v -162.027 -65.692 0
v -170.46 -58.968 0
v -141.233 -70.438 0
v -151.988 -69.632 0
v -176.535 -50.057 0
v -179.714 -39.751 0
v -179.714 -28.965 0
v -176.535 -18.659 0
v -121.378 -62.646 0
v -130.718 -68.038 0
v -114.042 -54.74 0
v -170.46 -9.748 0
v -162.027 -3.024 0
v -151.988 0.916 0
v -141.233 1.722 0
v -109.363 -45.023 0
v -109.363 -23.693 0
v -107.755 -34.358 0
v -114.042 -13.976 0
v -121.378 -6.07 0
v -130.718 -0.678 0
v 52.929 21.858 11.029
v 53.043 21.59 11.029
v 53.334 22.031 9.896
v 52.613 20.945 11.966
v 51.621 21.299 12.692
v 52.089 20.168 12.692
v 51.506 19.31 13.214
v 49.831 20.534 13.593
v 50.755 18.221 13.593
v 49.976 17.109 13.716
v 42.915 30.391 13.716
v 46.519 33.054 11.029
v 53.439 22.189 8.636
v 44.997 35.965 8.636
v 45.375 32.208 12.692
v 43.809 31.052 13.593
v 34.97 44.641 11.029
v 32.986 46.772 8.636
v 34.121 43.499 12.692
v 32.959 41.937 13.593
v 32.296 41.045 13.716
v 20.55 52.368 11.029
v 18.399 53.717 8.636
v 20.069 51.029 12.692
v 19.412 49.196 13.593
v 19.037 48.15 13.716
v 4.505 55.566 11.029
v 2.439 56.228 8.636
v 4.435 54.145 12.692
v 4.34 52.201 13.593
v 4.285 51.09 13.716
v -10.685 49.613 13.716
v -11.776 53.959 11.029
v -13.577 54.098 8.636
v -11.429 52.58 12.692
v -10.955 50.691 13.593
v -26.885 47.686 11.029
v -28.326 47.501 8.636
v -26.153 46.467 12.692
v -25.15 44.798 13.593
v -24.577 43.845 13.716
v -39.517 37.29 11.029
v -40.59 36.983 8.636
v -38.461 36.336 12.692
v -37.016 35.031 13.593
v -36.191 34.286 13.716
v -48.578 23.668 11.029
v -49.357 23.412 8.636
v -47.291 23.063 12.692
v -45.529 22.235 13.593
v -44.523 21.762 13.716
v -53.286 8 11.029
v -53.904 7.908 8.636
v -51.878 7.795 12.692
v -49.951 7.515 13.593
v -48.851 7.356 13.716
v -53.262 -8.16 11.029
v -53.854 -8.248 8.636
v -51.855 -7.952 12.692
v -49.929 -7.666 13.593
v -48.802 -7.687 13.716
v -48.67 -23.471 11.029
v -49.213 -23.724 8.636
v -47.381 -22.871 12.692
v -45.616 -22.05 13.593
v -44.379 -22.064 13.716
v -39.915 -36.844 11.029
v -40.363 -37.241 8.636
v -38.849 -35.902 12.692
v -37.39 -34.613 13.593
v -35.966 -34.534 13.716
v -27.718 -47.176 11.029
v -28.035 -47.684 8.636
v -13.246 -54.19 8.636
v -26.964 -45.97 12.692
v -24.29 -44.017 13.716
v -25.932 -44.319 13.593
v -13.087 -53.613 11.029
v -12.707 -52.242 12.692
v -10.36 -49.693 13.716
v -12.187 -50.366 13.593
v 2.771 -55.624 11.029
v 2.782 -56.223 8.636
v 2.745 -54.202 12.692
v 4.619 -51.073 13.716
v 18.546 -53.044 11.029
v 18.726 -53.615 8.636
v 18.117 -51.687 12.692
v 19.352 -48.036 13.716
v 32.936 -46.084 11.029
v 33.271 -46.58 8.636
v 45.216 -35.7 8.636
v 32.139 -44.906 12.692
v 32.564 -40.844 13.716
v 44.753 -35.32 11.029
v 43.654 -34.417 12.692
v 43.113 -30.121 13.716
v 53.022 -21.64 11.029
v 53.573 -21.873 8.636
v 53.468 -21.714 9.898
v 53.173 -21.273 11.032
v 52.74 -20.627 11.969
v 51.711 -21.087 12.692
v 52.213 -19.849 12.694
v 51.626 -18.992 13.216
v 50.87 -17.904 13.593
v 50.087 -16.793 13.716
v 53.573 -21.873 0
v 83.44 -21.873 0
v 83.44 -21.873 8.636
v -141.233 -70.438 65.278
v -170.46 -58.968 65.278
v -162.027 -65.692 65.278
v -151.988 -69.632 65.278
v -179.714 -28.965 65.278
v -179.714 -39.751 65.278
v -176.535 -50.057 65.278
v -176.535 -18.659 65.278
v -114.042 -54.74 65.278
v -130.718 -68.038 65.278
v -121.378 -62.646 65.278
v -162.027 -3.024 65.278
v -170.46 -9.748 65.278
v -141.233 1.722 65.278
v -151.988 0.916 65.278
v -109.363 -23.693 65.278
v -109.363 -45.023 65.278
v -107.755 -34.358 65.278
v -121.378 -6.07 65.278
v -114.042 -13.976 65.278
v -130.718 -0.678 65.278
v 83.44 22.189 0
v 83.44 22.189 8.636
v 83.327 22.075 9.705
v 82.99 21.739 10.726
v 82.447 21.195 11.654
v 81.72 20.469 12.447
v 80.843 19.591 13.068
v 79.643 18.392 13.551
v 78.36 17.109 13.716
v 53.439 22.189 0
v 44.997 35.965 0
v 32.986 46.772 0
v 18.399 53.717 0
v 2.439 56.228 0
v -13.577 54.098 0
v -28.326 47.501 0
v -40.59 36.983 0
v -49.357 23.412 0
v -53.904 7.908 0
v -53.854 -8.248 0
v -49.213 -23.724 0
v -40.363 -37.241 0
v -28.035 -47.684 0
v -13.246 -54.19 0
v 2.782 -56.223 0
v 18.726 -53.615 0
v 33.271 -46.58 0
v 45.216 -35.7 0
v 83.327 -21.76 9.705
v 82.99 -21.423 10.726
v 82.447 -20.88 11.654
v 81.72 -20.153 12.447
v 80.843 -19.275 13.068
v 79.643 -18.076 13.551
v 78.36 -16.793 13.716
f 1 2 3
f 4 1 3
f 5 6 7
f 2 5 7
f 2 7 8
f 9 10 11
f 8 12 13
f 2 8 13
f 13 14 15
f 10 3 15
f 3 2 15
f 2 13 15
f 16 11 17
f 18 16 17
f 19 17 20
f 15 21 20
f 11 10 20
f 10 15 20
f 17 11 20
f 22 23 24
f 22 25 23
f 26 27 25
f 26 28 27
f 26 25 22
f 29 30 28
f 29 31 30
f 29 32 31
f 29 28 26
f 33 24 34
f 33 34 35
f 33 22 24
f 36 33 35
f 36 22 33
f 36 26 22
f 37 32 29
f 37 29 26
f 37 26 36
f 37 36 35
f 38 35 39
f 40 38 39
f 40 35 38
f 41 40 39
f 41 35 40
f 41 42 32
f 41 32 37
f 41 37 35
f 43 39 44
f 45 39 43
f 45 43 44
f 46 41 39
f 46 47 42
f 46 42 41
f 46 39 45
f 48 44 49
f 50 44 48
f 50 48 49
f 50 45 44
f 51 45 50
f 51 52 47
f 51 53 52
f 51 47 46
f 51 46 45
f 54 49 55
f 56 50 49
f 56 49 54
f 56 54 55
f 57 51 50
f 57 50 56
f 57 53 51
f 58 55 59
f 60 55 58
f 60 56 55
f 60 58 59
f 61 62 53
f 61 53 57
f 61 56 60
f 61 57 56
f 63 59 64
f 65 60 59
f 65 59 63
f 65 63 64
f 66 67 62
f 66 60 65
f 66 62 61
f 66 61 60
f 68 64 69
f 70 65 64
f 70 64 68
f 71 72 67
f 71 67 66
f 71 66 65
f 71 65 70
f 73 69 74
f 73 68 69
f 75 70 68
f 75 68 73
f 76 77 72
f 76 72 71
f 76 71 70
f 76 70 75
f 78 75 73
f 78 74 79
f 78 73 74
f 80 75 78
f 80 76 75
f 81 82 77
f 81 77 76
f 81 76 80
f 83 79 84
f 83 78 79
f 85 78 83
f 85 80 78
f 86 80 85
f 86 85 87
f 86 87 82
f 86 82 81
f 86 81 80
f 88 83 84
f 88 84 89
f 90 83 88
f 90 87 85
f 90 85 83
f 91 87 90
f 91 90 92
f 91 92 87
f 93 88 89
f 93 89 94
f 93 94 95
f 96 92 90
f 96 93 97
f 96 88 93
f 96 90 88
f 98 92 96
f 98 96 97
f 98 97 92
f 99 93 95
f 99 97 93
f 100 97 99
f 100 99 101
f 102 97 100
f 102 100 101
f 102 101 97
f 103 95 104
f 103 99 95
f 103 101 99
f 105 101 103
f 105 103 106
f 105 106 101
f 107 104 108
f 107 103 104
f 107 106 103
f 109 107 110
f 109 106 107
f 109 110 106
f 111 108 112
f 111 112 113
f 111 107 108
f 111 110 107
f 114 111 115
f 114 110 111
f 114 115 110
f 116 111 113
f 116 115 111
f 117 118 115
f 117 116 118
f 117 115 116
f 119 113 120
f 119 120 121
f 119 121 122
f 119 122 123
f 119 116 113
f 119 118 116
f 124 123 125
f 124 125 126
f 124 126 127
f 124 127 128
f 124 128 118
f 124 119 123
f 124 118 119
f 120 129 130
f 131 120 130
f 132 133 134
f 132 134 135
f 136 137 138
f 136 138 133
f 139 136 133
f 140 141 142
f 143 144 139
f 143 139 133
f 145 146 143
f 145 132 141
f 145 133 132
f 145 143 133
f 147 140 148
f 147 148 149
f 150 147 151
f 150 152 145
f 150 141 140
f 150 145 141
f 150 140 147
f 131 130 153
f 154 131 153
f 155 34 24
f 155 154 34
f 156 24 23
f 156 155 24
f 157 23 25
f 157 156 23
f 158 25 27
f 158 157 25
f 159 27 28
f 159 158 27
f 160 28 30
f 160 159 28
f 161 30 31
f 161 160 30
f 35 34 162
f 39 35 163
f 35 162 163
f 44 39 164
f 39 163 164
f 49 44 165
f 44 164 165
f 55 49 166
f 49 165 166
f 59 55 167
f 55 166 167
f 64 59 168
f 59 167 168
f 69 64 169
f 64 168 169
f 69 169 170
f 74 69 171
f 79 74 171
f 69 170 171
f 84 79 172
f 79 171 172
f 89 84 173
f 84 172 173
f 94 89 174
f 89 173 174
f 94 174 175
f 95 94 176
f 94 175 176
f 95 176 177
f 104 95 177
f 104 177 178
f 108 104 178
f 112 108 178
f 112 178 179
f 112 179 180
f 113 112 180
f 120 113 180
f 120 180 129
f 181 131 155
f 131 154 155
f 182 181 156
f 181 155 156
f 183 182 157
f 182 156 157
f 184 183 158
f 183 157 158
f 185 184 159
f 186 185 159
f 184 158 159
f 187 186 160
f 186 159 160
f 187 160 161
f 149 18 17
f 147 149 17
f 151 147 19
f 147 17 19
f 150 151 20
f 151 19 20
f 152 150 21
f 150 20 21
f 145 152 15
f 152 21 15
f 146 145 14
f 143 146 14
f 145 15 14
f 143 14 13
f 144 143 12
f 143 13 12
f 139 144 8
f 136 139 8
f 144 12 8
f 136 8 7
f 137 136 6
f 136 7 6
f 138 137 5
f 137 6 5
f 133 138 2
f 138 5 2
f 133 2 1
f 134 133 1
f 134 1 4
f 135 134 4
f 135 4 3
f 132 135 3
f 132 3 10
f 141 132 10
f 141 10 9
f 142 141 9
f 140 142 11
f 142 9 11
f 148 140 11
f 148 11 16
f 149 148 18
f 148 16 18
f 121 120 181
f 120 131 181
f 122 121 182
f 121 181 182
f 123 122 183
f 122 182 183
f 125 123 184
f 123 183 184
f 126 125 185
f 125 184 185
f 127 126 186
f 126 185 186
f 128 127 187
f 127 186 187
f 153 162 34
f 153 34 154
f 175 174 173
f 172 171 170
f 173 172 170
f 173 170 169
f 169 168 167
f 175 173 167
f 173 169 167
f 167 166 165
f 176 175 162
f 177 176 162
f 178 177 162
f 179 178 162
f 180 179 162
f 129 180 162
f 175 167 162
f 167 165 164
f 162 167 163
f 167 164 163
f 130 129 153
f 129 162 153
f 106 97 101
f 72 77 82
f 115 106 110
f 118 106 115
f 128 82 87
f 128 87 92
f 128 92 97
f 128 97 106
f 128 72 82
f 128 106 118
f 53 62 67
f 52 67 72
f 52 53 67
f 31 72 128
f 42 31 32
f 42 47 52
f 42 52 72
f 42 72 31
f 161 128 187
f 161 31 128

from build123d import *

# Parameters (mm, degrees)
F0_R     = 56.232225
F1_W     = 88.388848
F1_H     = 44.062443
F2_DEPTH = 13.716
F3_R     = 5.08
F4_R     = 36.181427
F5_DEPTH = 65.278


with BuildPart() as f2:
    # F0 (on Top) + F1 (on Top) → F2 (new body)
    with BuildSketch(Plane.XY):
        with Locations((1.769612, 0)):
            Circle(F0_R)
    with BuildSketch(Plane.XY):
        with Locations((39.245977, 0.157928)):
            Rectangle(F1_W, F1_H)
    extrude(amount=F2_DEPTH)

    # F3
    f3_edges = [f2.edges().sort_by_distance(p)[0] for p in [
        (83.440401, 0.157928, 13.716),
        (68.439599, 22.18915, 13.716),
        (-54.462351, -0.171651, 13.716),
        (68.50685, -21.873293, 13.716),
    ]]
    fillet(f3_edges, radius=F3_R)


with BuildPart() as f5:
    # F4 (on Top) → F5 (new body)
    with BuildSketch(Plane.XY):
        with Locations((-143.936649, -34.357991)):
            Circle(F4_R)
    extrude(amount=F5_DEPTH)


solid = Compound([f2.part, f5.part])
